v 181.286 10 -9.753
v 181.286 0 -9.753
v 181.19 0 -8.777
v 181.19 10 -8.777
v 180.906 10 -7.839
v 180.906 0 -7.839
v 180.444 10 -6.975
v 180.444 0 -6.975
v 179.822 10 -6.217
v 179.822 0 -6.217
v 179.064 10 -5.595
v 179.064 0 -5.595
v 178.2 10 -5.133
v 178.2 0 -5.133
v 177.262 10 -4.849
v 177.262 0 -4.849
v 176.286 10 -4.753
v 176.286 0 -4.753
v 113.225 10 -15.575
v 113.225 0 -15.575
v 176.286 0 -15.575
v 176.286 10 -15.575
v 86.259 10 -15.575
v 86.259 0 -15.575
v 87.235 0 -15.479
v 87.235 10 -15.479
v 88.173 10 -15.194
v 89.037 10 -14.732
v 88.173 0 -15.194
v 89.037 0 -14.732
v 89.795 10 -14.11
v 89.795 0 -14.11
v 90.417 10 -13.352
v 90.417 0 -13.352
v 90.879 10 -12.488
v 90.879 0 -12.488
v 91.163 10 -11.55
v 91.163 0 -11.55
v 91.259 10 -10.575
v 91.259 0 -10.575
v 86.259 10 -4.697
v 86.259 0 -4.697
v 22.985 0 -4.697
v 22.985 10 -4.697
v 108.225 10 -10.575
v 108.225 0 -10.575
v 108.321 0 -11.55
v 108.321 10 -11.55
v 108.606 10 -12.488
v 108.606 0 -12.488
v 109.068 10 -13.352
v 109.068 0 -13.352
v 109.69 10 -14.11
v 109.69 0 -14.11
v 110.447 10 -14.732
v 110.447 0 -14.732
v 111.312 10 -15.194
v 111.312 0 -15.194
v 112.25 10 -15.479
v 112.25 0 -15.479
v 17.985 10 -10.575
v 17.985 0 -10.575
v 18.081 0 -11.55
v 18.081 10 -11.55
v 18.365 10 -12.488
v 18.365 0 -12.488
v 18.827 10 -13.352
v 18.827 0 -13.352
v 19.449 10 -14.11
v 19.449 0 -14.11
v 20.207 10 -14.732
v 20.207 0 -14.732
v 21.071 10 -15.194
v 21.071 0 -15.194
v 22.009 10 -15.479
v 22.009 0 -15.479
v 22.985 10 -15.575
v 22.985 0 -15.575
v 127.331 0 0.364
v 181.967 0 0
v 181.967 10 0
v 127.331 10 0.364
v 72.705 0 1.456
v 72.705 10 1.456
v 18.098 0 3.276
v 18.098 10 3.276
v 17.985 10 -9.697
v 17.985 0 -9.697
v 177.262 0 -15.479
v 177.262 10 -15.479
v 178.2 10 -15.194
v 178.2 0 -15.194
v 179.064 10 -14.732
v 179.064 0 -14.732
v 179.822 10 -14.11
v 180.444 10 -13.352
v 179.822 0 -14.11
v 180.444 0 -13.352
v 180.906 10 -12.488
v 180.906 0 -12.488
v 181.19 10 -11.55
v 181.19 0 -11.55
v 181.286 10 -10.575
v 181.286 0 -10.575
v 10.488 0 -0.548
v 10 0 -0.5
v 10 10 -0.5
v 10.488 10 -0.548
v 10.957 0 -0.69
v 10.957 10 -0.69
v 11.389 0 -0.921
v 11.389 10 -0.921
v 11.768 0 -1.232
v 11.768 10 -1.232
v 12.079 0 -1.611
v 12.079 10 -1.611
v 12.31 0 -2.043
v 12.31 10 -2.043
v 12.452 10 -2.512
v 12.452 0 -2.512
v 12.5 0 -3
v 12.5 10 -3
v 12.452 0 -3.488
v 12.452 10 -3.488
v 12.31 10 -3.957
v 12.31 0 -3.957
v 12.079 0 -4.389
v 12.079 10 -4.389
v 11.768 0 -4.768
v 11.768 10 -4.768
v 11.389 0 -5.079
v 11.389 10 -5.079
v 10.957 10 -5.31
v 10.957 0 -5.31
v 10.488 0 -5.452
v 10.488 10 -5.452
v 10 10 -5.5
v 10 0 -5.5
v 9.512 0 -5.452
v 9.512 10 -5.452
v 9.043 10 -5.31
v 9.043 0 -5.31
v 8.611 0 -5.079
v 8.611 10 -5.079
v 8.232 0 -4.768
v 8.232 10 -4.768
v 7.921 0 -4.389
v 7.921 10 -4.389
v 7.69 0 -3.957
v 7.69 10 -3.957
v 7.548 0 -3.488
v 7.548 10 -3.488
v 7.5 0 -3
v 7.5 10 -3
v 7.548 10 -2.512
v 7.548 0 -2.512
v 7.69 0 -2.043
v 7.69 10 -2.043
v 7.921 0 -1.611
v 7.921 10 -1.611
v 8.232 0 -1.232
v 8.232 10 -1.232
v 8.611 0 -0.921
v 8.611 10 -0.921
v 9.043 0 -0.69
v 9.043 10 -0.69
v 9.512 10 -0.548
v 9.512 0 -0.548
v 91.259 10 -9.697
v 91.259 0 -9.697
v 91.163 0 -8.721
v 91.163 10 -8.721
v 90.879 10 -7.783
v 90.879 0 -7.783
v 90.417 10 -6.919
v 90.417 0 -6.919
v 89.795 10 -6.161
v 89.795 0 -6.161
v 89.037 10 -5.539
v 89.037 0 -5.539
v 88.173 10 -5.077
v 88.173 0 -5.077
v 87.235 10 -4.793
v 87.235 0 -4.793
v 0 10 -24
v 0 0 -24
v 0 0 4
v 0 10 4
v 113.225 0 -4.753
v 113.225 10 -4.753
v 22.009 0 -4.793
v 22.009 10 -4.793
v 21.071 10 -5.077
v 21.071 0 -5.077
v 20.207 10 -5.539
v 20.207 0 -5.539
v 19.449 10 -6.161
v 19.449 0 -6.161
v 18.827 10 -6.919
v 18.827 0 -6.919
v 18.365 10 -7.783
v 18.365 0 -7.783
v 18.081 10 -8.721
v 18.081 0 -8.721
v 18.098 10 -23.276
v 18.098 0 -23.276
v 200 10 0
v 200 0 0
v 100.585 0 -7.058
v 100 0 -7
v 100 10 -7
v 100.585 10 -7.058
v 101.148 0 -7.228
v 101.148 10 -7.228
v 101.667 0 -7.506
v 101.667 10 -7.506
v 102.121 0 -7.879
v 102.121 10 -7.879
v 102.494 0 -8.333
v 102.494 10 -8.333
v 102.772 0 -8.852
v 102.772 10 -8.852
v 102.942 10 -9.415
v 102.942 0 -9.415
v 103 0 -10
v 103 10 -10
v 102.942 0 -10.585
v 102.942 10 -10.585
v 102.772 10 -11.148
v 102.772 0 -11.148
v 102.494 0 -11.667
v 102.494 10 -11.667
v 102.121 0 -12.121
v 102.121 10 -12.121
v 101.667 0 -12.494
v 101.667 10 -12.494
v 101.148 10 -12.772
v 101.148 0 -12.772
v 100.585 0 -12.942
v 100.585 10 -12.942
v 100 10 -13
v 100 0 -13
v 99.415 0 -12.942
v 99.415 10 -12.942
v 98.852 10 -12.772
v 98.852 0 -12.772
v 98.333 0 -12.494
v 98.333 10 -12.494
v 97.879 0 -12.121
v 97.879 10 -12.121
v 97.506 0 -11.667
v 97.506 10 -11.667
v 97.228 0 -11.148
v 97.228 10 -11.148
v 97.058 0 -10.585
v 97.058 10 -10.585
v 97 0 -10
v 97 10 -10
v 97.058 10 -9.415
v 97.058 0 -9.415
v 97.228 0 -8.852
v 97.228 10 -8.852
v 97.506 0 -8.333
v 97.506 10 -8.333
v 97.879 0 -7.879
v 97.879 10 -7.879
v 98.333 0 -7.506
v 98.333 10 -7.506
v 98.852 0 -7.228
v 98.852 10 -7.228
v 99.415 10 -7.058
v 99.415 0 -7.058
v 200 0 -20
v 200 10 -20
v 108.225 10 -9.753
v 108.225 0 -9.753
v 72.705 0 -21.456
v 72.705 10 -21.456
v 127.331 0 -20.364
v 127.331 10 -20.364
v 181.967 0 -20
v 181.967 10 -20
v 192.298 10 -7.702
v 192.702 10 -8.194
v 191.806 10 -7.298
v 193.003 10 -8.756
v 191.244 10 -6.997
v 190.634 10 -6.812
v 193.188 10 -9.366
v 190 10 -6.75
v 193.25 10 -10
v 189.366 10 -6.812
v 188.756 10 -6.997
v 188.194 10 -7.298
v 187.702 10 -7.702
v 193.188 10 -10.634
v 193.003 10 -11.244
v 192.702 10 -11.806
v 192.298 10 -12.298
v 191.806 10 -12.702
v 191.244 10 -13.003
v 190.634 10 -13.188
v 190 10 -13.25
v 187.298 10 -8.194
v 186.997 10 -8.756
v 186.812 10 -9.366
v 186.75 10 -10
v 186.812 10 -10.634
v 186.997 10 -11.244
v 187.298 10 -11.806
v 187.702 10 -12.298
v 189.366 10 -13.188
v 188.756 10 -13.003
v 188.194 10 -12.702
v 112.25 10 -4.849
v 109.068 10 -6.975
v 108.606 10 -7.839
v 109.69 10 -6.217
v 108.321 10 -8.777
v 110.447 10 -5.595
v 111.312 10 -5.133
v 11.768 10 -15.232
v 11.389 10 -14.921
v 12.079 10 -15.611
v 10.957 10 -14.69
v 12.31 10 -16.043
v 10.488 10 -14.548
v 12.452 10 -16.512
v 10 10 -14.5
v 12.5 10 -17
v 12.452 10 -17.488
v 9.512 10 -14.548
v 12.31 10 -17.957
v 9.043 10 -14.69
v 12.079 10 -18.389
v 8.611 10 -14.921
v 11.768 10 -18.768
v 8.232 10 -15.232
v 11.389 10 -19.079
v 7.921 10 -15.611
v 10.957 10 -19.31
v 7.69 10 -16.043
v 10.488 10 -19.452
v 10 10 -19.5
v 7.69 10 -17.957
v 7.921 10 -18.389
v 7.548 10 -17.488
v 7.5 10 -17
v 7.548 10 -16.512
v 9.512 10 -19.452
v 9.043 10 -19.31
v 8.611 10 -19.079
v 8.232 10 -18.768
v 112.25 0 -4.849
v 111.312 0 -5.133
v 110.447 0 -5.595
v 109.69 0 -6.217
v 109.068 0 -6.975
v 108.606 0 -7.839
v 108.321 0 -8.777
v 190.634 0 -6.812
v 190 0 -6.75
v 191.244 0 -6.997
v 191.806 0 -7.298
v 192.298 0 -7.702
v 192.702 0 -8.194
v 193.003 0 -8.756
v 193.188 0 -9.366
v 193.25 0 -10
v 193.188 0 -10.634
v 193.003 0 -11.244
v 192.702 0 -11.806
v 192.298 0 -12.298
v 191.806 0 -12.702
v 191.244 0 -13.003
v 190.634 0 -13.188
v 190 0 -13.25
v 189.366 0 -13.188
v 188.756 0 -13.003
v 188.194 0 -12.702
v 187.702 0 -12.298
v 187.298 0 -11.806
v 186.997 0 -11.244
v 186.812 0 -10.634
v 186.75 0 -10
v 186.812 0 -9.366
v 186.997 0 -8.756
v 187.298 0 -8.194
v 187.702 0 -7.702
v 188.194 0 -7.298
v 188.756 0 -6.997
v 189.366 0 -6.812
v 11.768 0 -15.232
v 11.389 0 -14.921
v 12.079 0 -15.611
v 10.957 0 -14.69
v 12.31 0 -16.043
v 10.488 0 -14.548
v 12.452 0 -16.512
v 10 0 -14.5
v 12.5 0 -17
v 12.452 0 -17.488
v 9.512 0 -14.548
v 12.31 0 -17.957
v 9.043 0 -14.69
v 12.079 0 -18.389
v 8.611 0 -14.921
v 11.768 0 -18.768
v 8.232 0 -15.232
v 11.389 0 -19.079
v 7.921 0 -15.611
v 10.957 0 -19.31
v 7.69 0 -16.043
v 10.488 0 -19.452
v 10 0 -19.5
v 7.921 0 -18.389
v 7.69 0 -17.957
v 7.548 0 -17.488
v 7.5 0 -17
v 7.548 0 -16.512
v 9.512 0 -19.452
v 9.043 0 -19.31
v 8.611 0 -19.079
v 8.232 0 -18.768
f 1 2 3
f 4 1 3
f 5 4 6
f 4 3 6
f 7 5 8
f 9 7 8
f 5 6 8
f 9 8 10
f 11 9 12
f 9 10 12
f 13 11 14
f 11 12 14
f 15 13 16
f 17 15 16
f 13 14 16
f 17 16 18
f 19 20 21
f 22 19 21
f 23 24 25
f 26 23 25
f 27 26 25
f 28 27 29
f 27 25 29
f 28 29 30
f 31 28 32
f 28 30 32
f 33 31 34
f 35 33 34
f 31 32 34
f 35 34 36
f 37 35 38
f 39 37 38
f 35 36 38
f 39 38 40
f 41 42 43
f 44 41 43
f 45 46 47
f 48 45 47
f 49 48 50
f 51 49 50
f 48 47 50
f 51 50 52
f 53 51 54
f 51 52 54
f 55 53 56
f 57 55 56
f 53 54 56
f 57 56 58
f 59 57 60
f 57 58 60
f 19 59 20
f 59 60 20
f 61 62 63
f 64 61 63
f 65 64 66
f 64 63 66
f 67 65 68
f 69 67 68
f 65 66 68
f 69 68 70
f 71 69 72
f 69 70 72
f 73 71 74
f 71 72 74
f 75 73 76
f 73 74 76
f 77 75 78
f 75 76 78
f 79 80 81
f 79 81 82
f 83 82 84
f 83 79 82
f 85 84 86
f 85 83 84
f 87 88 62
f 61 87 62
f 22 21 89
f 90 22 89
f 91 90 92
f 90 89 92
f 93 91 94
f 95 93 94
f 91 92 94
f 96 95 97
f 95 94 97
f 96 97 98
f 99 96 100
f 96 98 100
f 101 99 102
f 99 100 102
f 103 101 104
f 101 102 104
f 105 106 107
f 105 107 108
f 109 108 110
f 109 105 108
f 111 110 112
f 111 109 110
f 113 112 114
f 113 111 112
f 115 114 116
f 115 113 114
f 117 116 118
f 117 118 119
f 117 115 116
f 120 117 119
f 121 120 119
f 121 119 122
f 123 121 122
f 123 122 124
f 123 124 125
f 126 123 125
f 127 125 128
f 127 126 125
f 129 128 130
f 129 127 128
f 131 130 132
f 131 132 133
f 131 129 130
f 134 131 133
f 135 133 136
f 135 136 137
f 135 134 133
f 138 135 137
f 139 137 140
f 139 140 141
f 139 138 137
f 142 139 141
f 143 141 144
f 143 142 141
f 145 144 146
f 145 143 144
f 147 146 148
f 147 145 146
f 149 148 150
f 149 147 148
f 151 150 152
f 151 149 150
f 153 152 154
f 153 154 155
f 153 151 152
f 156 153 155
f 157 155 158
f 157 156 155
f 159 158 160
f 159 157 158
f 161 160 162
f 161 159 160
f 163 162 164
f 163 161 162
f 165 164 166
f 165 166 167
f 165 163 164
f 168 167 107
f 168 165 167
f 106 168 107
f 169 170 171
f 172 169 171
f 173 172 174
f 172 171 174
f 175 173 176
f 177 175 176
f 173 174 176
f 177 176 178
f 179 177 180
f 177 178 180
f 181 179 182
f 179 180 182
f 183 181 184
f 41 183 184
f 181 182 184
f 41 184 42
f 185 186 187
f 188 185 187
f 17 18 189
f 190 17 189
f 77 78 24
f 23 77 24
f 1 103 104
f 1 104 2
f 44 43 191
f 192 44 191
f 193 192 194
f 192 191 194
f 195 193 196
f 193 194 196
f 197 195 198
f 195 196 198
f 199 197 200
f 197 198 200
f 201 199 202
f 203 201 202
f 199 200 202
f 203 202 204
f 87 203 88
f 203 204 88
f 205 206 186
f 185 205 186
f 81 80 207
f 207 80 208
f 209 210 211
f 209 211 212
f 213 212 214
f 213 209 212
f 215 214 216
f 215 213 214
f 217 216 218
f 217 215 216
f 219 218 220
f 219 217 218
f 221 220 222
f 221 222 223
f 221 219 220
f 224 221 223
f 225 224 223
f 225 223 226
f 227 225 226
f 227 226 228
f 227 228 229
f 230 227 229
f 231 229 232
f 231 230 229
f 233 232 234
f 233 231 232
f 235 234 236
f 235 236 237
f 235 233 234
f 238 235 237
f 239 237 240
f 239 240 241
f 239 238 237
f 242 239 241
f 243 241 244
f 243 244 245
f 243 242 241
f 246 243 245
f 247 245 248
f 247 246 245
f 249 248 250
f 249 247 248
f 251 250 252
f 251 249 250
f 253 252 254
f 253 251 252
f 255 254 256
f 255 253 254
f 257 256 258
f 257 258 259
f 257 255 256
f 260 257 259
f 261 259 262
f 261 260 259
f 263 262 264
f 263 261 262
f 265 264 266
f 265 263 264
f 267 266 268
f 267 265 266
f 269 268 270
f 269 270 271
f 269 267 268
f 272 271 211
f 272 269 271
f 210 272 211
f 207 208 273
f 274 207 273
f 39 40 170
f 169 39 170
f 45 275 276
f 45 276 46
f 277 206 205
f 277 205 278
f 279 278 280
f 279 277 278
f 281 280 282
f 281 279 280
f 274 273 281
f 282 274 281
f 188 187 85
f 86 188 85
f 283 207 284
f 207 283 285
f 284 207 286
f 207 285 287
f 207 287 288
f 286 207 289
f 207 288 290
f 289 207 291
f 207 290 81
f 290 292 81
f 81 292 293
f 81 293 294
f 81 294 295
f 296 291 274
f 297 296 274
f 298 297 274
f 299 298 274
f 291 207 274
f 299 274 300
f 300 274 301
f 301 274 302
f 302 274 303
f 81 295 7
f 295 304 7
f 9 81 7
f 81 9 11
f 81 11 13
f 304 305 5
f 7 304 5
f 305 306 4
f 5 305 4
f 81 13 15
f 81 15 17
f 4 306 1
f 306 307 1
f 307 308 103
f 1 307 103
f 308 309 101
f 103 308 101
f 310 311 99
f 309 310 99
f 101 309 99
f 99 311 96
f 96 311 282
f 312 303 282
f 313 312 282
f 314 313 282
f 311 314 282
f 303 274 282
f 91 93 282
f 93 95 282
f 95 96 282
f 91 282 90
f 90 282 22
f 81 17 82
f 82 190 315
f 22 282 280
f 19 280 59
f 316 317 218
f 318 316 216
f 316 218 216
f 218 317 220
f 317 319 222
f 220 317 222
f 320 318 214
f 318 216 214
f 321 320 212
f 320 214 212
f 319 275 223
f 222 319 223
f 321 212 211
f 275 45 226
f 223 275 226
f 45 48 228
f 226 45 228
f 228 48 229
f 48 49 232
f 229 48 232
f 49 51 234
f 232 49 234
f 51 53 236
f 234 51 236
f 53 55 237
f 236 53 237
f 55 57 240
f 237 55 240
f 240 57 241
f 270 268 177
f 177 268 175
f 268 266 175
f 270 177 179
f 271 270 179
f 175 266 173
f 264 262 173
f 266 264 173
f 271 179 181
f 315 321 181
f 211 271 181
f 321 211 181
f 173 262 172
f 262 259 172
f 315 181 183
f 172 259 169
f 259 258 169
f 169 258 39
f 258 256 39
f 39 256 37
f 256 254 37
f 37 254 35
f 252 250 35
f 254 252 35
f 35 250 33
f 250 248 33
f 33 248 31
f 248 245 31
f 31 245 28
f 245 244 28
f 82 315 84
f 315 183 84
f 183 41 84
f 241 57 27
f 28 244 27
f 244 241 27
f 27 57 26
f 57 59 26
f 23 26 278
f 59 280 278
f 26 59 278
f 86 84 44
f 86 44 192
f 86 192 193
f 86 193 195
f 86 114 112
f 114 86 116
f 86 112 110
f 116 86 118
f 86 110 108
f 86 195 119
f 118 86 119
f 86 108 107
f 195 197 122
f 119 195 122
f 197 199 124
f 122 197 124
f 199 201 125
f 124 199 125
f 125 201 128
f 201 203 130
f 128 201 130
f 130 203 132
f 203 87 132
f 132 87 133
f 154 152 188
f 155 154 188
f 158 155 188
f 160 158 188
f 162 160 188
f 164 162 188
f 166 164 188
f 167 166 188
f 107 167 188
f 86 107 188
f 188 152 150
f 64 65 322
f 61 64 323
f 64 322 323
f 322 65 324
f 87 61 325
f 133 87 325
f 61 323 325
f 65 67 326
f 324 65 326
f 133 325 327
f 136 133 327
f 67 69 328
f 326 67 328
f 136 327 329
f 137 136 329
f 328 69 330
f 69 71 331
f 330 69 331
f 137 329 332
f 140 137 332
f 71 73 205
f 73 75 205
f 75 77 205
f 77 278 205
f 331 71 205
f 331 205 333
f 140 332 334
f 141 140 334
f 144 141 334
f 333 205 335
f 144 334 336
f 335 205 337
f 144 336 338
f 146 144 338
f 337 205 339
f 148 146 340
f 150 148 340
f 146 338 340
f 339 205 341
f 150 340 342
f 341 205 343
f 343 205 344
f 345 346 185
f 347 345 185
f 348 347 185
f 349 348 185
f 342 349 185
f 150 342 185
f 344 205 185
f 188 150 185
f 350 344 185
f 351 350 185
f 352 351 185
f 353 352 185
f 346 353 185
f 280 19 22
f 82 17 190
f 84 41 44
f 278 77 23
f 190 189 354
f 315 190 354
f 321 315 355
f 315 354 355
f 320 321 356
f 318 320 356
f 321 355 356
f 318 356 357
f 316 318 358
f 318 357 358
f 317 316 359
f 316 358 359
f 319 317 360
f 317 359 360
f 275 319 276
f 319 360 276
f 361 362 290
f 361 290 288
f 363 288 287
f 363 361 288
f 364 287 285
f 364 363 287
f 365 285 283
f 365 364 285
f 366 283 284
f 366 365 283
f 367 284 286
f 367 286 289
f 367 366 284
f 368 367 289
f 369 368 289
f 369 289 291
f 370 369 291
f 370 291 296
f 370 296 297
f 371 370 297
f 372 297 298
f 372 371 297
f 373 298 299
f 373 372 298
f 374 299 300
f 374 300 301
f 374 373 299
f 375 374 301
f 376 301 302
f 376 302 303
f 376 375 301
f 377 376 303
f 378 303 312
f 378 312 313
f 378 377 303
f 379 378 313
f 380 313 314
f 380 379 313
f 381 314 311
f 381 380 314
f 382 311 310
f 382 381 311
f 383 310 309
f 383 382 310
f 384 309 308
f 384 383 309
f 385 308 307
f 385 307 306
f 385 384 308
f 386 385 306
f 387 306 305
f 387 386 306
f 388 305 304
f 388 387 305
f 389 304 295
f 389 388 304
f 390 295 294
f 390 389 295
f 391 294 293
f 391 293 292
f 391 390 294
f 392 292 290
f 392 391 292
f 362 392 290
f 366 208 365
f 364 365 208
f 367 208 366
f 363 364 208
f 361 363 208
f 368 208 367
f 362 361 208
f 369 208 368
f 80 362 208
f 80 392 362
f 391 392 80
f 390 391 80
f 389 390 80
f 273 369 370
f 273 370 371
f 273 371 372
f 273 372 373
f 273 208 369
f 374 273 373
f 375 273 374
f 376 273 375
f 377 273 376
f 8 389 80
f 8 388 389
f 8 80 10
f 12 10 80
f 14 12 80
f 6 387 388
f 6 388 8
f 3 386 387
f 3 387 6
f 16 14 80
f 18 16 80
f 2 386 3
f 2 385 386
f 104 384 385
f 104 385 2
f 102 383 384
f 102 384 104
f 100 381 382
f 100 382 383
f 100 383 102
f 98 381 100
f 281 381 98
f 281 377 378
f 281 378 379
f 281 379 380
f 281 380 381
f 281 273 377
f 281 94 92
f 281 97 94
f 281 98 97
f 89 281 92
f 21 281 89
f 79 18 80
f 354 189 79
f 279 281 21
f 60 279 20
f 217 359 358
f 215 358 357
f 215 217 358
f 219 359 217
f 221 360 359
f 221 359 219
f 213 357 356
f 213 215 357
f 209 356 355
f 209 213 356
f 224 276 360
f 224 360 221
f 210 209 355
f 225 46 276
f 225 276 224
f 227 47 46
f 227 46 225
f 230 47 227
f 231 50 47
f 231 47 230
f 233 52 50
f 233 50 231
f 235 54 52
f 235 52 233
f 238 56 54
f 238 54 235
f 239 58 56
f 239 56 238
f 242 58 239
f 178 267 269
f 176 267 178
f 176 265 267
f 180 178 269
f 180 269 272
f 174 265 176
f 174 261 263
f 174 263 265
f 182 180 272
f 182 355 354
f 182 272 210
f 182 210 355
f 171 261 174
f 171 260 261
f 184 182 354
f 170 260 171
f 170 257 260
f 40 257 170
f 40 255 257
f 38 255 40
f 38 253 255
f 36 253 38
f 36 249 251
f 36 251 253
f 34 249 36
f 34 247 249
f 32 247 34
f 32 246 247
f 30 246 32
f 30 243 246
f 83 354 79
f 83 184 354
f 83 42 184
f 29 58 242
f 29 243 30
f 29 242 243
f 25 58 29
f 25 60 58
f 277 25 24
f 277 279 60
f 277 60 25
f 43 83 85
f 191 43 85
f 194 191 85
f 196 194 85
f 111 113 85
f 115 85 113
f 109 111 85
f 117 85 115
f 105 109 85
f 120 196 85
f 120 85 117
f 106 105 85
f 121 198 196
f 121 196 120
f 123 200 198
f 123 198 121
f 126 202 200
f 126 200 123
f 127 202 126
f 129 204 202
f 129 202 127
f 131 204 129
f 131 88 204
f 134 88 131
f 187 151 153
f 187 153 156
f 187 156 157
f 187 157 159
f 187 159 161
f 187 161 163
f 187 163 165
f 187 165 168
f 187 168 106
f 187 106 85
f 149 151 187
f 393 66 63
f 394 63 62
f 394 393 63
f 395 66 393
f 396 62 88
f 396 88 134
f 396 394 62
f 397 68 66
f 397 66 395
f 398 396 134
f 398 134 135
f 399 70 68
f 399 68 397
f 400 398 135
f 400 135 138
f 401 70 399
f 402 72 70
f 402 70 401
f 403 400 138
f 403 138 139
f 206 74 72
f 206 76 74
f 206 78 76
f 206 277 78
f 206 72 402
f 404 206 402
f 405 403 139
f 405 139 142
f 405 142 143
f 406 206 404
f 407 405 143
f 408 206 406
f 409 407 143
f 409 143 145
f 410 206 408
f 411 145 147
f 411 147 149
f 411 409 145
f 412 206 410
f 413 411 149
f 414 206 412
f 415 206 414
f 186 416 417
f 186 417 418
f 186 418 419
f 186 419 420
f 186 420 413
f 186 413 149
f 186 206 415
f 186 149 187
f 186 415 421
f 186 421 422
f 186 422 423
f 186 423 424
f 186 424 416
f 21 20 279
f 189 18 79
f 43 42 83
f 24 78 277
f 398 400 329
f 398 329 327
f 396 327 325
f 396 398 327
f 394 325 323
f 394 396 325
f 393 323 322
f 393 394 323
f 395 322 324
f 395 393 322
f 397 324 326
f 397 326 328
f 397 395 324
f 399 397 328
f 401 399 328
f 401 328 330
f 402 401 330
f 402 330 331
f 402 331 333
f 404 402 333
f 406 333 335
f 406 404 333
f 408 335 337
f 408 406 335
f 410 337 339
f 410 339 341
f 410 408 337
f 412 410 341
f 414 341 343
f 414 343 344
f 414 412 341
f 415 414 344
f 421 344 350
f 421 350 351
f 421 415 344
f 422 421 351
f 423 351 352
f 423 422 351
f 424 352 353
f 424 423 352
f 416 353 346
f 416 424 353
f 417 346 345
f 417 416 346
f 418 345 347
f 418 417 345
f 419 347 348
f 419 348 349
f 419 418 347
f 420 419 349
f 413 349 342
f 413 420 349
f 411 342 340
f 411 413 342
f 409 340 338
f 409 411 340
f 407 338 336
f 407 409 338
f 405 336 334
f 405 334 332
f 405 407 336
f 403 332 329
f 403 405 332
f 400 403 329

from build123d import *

# Parameters (mm, degrees)
SZKIC1_R                    = 3
SZKIC1_R_2                  = 3.25
SZKIC1_R_3                  = 2.5
DODANIE_WYCI_GNI_CIE1_DEPTH = 10
ZAOKR_GLENIE1_R             = 4100


with BuildPart() as part:
    # Szkic1 → Dodanie-wyciągnięcie1 (new body)
    with BuildSketch(Plane(origin=(0, 0, 0), x_dir=(1, 0, 0), z_dir=(0, 1, 0))):
        Polygon((200, 0), (200, 20), (100, 20), (0, 24), (0, -4), (100, 0), align=None)
        with Locations(Location((100, 10, 0), (0, 0, 270))):
            Circle(SZKIC1_R, mode=Mode.SUBTRACT)
        with Locations(Location((190, 10, 0), (0, 0, 270))):
            Circle(SZKIC1_R_2, mode=Mode.SUBTRACT)
        with Locations(Location((10, 17, 0), (0, 0, 270))):
            Circle(SZKIC1_R_3, mode=Mode.SUBTRACT)
        with Locations(Location((10, 3, 0), (0, 0, 270))):
            Circle(SZKIC1_R_3, mode=Mode.SUBTRACT)
        with BuildLine():
            Line((22.984822323, 15.57457628), (86.25939238, 15.57457628))
            ThreePointArc((86.25939238, 15.57457628), (89.794926286, 14.110110186), (91.25939238, 10.57457628))
            Line((91.25939238, 10.57457628), (91.25939238, 9.696719379))
            ThreePointArc((91.25939238, 9.696719379), (89.794926286, 6.161185473), (86.25939238, 4.696719379))
            Line((86.25939238, 4.696719379), (22.984822323, 4.696719379))
            ThreePointArc((22.984822323, 4.696719379), (19.449288417, 6.161185473), (17.984822323, 9.696719379))
            Line((17.984822323, 9.696719379), (17.984822323, 10.57457628))
            ThreePointArc((17.984822323, 10.57457628), (19.449288417, 14.110110186), (22.984822323, 15.57457628))
        make_face(mode=Mode.SUBTRACT)
        with BuildLine():
            Line((113.225148066, 15.57457628), (176.286209663, 15.57457628))
            ThreePointArc((176.286209663, 15.57457628), (179.821743569, 14.110110186), (181.286209663, 10.57457628))
            Line((181.286209663, 10.57457628), (181.286209663, 9.752776346))
            ThreePointArc((181.286209663, 9.752776346), (179.821743569, 6.21724244), (176.286209663, 4.752776346))
            Line((176.286209663, 4.752776346), (113.225148066, 4.752776346))
            ThreePointArc((113.225148066, 4.752776346), (109.68961416, 6.21724244), (108.225148066, 9.752776346))
            Line((108.225148066, 9.752776346), (108.225148066, 10.57457628))
            ThreePointArc((108.225148066, 10.57457628), (109.68961416, 14.110110186), (113.225148066, 15.57457628))
        make_face(mode=Mode.SUBTRACT)
    extrude(amount=DODANIE_WYCI_GNI_CIE1_DEPTH)

    # Zaokrąglenie1
    # the kernel refuses this fillet: 4100 mm, written as the material it adds along each edge
    with BuildSketch(Plane(origin=(100, 0, -20), x_dir=(1, 0, 0), z_dir=(0, 1, 0)), Plane(origin=(100, 0, 0), x_dir=(-0.9992009587217893, 0, 0.03996803834887583), z_dir=(0, 1, 0))) as zaokr_glenie1_piece_1:
        with BuildLine():
            CenterArc((ZAOKR_GLENIE1_R * 0.0199920063936, ZAOKR_GLENIE1_R), ZAOKR_GLENIE1_R, 267.709389957, 2.290610043)
            Line((-ZAOKR_GLENIE1_R * 0.0199760319553, ZAOKR_GLENIE1_R * 0.000799041278211), (0, 0))
            Line((0, 0), (ZAOKR_GLENIE1_R * 0.0199920063936, 0))
        make_face()
    extrude(amount=10)


solid = part.part
